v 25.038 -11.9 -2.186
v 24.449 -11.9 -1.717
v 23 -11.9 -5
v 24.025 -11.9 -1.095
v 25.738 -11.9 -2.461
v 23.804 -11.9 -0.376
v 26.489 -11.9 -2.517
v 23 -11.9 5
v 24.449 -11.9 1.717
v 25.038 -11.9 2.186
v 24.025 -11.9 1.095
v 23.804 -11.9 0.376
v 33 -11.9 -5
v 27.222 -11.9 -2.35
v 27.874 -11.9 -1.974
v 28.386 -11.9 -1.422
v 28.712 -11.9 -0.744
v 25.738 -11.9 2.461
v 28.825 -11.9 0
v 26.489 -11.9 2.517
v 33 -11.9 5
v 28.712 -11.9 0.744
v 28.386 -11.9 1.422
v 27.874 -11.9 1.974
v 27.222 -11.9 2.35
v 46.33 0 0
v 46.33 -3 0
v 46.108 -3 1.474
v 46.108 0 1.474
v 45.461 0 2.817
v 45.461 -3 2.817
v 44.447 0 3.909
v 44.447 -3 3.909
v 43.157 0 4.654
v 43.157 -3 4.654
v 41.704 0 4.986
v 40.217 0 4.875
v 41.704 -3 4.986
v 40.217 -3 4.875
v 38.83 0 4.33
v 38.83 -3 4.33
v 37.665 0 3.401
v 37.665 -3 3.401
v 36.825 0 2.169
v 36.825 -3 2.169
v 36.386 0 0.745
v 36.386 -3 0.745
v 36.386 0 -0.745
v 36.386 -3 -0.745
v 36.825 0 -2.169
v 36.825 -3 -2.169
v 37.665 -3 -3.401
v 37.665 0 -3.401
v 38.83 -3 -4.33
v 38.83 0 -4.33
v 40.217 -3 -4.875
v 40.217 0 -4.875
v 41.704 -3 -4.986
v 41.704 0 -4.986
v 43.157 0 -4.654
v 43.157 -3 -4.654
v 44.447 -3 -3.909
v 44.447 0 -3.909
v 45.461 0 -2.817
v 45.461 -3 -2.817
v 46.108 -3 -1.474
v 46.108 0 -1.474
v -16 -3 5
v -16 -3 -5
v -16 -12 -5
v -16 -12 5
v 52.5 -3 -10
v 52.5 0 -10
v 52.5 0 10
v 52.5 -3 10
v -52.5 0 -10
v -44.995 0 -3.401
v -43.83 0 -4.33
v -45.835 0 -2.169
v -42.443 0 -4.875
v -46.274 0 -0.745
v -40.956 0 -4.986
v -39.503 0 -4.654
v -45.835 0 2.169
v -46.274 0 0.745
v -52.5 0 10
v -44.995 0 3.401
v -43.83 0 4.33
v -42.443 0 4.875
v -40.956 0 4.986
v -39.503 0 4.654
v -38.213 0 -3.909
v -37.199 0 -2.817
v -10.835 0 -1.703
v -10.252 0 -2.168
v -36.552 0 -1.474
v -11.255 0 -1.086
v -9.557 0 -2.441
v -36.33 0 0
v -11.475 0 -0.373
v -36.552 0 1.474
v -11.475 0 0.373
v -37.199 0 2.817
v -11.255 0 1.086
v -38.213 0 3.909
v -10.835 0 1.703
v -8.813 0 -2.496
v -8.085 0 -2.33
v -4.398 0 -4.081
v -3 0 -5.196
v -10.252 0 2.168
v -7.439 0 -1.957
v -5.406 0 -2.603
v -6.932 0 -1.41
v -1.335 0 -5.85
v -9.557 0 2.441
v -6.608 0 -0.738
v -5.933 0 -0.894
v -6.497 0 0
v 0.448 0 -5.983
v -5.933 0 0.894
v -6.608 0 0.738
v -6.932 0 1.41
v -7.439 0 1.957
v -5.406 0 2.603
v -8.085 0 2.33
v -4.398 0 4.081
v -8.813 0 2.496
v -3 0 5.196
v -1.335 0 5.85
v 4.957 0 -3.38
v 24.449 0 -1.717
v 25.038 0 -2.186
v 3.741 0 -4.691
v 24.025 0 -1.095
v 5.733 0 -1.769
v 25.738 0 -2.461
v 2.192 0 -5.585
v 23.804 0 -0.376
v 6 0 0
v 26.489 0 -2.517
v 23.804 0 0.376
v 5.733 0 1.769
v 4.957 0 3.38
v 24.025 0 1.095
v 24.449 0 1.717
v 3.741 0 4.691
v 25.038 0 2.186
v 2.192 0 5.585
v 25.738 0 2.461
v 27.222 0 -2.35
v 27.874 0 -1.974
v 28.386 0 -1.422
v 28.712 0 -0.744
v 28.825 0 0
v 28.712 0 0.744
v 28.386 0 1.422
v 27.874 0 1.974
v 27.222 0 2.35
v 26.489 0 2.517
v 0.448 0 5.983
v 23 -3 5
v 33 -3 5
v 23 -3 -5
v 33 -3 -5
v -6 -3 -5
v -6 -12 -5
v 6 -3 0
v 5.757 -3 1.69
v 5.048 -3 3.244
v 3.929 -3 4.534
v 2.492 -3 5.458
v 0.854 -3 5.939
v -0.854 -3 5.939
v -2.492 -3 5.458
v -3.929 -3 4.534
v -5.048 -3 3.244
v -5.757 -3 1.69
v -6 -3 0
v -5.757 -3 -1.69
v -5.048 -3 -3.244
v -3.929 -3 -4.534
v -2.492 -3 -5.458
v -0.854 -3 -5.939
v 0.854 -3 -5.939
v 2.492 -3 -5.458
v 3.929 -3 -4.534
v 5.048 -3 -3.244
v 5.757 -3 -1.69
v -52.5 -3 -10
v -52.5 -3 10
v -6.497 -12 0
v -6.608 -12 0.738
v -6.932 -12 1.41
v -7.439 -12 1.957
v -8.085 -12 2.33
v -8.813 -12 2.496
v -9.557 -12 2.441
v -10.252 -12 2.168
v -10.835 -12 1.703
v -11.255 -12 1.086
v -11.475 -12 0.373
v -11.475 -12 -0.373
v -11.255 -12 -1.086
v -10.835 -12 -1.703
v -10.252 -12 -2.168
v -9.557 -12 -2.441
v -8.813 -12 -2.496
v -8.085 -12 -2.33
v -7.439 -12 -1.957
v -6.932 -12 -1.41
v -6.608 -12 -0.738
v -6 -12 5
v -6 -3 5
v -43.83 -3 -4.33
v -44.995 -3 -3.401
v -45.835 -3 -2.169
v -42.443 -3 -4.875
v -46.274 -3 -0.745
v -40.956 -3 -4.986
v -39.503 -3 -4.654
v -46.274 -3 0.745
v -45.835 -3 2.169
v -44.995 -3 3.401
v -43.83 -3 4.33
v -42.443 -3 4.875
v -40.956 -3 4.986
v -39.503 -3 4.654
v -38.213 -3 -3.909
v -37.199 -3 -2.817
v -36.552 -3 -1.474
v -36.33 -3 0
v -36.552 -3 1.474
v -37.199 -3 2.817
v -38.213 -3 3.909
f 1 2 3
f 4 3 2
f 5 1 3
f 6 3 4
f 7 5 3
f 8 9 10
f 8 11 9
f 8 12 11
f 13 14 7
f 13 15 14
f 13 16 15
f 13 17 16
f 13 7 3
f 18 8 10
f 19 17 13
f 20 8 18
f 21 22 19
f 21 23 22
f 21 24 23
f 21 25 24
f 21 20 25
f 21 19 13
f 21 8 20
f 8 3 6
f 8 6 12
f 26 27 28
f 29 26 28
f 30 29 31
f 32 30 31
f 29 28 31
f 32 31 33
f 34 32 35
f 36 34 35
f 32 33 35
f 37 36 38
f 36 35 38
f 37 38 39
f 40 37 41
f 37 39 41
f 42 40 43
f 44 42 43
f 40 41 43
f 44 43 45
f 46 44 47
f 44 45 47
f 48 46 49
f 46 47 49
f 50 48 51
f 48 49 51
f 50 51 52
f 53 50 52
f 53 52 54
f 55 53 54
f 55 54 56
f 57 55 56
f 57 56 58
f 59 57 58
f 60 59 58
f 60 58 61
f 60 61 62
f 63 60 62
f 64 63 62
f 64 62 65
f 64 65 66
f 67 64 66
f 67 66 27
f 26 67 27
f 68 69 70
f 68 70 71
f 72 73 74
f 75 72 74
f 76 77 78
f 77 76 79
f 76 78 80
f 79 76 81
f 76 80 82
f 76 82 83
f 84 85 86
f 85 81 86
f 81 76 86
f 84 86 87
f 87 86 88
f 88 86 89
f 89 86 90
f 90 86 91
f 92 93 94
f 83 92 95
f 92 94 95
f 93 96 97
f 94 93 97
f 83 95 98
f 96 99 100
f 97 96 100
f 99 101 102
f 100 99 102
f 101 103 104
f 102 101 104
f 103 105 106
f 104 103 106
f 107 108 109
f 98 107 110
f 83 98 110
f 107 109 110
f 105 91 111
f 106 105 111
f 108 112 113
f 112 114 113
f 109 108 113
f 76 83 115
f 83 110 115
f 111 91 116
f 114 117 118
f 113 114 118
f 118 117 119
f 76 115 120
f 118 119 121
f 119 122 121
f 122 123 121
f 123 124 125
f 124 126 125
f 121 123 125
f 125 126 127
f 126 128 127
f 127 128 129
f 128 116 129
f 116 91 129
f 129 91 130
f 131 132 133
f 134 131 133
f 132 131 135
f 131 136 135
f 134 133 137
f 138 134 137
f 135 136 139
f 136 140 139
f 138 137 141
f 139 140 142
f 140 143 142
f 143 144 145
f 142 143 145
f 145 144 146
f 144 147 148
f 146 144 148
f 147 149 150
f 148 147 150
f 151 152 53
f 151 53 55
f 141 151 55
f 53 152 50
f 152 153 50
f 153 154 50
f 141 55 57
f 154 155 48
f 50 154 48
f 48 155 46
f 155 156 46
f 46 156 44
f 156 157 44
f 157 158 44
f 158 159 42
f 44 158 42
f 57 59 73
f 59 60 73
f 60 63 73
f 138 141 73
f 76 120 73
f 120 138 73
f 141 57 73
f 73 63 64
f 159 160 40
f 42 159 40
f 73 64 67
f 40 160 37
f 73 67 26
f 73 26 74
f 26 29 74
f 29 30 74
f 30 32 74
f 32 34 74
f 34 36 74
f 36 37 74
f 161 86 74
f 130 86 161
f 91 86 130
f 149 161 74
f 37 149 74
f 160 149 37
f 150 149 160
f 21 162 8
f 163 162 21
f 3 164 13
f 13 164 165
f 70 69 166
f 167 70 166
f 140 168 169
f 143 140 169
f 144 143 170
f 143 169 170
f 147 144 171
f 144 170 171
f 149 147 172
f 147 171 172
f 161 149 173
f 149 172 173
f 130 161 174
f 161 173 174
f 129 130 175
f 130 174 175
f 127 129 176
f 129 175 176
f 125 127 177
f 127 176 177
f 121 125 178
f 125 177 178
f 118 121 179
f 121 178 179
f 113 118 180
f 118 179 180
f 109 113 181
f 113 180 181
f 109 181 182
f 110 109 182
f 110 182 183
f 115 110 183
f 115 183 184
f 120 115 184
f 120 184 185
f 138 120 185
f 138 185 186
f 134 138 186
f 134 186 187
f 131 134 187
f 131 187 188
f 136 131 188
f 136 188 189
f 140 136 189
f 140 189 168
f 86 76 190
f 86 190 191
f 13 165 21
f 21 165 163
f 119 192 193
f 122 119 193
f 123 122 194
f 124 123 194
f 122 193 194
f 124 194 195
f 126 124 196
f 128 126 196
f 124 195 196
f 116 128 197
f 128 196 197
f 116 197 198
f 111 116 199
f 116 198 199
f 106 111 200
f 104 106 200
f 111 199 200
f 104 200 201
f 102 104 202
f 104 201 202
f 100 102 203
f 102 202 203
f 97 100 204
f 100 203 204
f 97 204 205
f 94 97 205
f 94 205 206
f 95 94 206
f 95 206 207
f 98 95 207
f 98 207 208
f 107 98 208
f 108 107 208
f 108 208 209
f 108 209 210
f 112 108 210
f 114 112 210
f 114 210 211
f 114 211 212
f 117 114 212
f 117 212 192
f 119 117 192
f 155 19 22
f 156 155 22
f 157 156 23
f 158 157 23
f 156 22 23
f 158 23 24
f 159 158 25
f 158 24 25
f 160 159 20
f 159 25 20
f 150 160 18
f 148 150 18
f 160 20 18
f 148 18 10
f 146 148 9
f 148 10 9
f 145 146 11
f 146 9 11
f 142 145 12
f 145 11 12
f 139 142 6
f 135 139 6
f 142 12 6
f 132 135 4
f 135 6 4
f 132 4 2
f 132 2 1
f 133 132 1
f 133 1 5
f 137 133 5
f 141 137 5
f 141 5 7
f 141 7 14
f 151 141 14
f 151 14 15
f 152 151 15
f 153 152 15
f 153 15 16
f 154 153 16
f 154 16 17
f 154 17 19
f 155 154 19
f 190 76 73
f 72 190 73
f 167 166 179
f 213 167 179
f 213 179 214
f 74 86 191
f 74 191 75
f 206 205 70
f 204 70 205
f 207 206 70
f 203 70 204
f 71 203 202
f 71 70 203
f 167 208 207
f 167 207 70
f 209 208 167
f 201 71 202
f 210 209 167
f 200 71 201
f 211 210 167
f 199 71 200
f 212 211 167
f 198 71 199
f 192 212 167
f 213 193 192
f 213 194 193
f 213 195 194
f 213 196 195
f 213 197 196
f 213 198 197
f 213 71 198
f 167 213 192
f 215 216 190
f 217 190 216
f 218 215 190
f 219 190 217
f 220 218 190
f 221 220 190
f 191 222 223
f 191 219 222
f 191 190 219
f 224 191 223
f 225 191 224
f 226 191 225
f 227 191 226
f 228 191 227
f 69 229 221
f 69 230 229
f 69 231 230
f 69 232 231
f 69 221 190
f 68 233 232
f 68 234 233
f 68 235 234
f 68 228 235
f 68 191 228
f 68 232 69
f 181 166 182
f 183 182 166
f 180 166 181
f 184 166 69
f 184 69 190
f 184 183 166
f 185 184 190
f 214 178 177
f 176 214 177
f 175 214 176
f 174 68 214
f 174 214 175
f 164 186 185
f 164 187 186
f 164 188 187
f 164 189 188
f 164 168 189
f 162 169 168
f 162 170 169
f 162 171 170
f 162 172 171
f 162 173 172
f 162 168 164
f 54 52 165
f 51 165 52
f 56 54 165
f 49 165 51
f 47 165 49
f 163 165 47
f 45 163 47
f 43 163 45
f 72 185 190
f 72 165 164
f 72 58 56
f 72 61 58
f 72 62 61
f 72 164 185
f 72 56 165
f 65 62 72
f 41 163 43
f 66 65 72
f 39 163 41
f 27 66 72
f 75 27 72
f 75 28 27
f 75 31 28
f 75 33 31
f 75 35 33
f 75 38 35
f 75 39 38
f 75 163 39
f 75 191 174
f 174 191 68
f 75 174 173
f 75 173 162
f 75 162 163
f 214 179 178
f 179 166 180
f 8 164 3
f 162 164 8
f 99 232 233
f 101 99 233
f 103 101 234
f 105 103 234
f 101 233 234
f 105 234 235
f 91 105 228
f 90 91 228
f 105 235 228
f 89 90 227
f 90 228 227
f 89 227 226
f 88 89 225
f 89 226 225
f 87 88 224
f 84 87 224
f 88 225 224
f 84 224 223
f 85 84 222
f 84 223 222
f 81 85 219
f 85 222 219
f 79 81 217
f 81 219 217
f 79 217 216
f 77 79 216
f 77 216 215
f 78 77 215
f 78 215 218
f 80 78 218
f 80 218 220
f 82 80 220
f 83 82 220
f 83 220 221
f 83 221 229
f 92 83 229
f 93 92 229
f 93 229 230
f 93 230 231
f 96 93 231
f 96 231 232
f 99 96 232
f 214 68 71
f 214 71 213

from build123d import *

# Parameters (mm, degrees)
F0_W     = 105
F0_H     = 20
F1_DEPTH = 3
F2_R     = 6
F2_R_2   = 5
F3_DEPTH = 25
F5_W     = 10
F5_H     = 10
F6_DEPTH = 8.9
F4_W     = 10
F4_H     = 10
F7_DEPTH = 9
F8_R     = 2.50333
F8_R_2   = 2.524532
F9_DEPTH = 25


with BuildPart() as f1:
    # F0 (on Front) → F1 (new body)
    with BuildSketch(Plane.XZ):
        Rectangle(F0_W, F0_H)
    extrude(amount=F1_DEPTH)

    # F2 (on face) → F3 (cut)
    with BuildSketch(Plane.XZ.offset(3)):
        Circle(F2_R)
        with Locations((-41.33, 0)):
            Circle(F2_R_2)
        with Locations((41.33, 0)):
            Circle(F2_R_2)
    extrude(amount=-F3_DEPTH, mode=Mode.SUBTRACT)

    # F5 (on face) → F6 (join)
    with BuildSketch(Plane.XZ.offset(3)):
        with Locations((28, 0)):
            Rectangle(F5_W, F5_H)
    extrude(amount=F6_DEPTH)

    # F4 (on face) → F7 (join)
    with BuildSketch(Plane.XZ.offset(3)):
        with Locations((-11, 0)):
            Rectangle(F4_W, F4_H)
    extrude(amount=F7_DEPTH)

    # F8 (on face) → F9 (cut)
    with BuildSketch(Plane.XZ.offset(12)):
        with Locations((-9, 0)):
            Circle(F8_R)
        with Locations((26.3, 0)):
            Circle(F8_R_2)
    extrude(amount=-F9_DEPTH, mode=Mode.SUBTRACT)


solid = f1.part
